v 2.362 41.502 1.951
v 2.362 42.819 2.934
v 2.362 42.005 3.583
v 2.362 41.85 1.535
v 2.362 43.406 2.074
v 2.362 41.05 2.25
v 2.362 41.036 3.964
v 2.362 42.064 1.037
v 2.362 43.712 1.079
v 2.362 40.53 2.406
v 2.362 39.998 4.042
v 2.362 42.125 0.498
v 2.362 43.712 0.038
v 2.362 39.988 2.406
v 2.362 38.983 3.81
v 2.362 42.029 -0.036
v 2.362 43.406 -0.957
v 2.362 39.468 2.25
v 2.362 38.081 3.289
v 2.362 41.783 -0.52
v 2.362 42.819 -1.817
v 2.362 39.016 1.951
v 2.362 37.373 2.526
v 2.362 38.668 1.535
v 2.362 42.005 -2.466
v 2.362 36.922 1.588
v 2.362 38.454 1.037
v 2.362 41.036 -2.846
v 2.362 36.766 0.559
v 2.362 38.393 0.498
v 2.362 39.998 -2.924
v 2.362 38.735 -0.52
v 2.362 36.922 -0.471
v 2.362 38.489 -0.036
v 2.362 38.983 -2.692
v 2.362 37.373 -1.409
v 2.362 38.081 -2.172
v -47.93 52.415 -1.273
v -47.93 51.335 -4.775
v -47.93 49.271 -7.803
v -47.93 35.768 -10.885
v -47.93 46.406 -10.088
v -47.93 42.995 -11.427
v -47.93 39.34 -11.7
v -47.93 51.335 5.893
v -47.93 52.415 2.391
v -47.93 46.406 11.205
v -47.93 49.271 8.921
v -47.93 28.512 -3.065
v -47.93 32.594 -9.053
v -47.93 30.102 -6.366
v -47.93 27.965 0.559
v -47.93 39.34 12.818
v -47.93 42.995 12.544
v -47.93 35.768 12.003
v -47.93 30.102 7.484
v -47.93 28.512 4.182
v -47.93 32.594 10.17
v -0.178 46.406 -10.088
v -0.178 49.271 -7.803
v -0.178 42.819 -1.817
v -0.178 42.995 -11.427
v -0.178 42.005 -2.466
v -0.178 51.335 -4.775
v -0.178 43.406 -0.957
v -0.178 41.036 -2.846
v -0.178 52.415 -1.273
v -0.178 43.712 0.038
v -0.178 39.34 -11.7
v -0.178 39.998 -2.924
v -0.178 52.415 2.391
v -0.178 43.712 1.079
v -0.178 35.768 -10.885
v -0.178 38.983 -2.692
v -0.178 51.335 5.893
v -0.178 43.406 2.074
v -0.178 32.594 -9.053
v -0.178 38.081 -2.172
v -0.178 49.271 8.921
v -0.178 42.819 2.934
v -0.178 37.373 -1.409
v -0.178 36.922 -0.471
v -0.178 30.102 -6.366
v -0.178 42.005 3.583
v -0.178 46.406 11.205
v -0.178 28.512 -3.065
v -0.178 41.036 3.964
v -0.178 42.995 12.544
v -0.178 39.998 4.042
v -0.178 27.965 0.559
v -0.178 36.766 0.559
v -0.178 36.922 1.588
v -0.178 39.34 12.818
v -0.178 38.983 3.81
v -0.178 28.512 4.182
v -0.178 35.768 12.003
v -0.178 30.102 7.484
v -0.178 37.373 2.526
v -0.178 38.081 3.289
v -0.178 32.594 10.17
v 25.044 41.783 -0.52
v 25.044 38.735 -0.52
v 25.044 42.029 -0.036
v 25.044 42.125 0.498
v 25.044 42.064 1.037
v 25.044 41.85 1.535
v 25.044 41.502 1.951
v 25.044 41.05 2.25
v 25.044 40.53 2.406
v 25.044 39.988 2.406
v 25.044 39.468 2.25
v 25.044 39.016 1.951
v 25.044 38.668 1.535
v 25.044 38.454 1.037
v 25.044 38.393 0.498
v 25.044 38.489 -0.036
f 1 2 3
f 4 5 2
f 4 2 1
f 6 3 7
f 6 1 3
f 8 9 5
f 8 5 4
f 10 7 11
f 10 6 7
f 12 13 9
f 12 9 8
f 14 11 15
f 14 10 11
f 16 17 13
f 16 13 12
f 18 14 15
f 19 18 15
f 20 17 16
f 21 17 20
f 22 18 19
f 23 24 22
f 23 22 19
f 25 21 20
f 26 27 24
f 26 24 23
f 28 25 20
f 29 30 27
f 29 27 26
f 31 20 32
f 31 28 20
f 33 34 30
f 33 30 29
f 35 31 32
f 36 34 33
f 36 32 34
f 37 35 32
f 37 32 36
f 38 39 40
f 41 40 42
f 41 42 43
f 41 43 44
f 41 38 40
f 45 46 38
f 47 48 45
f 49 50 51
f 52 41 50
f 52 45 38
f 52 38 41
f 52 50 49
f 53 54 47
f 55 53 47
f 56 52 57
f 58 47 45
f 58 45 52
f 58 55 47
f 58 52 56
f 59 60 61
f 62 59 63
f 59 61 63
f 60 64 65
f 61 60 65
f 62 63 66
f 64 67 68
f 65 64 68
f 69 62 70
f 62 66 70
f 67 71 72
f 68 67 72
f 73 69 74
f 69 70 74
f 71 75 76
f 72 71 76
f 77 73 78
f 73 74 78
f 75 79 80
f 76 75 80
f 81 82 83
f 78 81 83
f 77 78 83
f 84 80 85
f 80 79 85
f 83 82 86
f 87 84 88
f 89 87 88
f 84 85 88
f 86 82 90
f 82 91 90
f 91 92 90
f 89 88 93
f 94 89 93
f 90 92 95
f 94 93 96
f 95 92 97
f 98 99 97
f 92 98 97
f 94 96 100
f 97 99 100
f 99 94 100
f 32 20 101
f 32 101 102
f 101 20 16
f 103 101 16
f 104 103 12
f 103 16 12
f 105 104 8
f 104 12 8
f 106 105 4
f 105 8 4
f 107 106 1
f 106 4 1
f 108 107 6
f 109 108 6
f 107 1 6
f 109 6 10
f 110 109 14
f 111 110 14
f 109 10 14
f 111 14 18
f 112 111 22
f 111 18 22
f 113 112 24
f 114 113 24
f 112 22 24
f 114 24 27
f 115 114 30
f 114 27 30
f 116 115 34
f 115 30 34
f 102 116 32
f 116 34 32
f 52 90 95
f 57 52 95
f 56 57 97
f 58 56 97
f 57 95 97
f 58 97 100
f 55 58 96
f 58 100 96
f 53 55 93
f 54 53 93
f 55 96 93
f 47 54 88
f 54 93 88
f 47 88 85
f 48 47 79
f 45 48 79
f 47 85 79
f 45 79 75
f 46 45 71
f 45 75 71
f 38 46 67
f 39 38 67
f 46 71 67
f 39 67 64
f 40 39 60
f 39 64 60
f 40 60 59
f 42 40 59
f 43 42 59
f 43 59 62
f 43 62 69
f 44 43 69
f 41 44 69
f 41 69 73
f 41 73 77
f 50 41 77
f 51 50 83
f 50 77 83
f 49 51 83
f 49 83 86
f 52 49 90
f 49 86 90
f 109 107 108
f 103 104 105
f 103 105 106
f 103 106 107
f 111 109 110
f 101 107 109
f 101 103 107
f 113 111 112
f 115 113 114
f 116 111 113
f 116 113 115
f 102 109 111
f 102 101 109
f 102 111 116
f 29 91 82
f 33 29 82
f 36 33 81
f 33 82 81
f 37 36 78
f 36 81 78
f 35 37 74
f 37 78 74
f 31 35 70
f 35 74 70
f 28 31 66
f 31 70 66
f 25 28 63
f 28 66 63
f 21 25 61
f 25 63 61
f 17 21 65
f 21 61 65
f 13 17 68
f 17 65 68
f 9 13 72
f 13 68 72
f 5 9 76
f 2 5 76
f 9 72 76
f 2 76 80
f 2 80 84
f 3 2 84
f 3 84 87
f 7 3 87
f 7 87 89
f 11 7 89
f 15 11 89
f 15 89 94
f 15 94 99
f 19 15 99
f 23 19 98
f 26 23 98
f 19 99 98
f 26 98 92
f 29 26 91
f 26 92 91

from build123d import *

# Parameters (mm, degrees)
SKETCH058_R             = 12.2936
PAD026_DEPTH            = 47.752
PAD027_DEPTH            = 25.2222
SKETCH062_R             = 3.4925
PAD029_DEPTH            = 2.54
BODY021_PLACEMENT_ANGLE = 180


with BuildPart() as part:
    # Sketch058 → Pad026 (new body)
    with BuildSketch(Plane.YZ):
        Circle(SKETCH058_R)
    extrude(amount=PAD026_DEPTH)

    # Sketch059 (on Face2 of Pad026) → Pad027 (join)
    with BuildSketch(Plane(origin=(0, 0, 0), x_dir=(0, 1, 0), z_dir=(-1, 0, 0))):
        with BuildLine():
            ThreePointArc((-1.524, 1.078304), (0, -1.8669), (1.524, 1.078304))
            Line((-1.524, 1.078304), (1.524, 1.078304))
        make_face()
    extrude(amount=PAD027_DEPTH)

    # Sketch062 (on Face2 of Pad027) → Pad029 (join)
    with BuildSketch(Plane(origin=(0, 0, 0), x_dir=(0, 1, 0), z_dir=(-1, 0, 0))):
        Circle(SKETCH062_R)
    extrude(amount=PAD029_DEPTH)


with BuildPart() as part_1:
    # Body021 placement: moved
    add(part.part.moved(Location((-0.1778, 40.259, 0.5588))).rotate(Axis((-0.1778, 40.259, 0.5588), (0, 0, 1)), BODY021_PLACEMENT_ANGLE))


solid = part_1.part
